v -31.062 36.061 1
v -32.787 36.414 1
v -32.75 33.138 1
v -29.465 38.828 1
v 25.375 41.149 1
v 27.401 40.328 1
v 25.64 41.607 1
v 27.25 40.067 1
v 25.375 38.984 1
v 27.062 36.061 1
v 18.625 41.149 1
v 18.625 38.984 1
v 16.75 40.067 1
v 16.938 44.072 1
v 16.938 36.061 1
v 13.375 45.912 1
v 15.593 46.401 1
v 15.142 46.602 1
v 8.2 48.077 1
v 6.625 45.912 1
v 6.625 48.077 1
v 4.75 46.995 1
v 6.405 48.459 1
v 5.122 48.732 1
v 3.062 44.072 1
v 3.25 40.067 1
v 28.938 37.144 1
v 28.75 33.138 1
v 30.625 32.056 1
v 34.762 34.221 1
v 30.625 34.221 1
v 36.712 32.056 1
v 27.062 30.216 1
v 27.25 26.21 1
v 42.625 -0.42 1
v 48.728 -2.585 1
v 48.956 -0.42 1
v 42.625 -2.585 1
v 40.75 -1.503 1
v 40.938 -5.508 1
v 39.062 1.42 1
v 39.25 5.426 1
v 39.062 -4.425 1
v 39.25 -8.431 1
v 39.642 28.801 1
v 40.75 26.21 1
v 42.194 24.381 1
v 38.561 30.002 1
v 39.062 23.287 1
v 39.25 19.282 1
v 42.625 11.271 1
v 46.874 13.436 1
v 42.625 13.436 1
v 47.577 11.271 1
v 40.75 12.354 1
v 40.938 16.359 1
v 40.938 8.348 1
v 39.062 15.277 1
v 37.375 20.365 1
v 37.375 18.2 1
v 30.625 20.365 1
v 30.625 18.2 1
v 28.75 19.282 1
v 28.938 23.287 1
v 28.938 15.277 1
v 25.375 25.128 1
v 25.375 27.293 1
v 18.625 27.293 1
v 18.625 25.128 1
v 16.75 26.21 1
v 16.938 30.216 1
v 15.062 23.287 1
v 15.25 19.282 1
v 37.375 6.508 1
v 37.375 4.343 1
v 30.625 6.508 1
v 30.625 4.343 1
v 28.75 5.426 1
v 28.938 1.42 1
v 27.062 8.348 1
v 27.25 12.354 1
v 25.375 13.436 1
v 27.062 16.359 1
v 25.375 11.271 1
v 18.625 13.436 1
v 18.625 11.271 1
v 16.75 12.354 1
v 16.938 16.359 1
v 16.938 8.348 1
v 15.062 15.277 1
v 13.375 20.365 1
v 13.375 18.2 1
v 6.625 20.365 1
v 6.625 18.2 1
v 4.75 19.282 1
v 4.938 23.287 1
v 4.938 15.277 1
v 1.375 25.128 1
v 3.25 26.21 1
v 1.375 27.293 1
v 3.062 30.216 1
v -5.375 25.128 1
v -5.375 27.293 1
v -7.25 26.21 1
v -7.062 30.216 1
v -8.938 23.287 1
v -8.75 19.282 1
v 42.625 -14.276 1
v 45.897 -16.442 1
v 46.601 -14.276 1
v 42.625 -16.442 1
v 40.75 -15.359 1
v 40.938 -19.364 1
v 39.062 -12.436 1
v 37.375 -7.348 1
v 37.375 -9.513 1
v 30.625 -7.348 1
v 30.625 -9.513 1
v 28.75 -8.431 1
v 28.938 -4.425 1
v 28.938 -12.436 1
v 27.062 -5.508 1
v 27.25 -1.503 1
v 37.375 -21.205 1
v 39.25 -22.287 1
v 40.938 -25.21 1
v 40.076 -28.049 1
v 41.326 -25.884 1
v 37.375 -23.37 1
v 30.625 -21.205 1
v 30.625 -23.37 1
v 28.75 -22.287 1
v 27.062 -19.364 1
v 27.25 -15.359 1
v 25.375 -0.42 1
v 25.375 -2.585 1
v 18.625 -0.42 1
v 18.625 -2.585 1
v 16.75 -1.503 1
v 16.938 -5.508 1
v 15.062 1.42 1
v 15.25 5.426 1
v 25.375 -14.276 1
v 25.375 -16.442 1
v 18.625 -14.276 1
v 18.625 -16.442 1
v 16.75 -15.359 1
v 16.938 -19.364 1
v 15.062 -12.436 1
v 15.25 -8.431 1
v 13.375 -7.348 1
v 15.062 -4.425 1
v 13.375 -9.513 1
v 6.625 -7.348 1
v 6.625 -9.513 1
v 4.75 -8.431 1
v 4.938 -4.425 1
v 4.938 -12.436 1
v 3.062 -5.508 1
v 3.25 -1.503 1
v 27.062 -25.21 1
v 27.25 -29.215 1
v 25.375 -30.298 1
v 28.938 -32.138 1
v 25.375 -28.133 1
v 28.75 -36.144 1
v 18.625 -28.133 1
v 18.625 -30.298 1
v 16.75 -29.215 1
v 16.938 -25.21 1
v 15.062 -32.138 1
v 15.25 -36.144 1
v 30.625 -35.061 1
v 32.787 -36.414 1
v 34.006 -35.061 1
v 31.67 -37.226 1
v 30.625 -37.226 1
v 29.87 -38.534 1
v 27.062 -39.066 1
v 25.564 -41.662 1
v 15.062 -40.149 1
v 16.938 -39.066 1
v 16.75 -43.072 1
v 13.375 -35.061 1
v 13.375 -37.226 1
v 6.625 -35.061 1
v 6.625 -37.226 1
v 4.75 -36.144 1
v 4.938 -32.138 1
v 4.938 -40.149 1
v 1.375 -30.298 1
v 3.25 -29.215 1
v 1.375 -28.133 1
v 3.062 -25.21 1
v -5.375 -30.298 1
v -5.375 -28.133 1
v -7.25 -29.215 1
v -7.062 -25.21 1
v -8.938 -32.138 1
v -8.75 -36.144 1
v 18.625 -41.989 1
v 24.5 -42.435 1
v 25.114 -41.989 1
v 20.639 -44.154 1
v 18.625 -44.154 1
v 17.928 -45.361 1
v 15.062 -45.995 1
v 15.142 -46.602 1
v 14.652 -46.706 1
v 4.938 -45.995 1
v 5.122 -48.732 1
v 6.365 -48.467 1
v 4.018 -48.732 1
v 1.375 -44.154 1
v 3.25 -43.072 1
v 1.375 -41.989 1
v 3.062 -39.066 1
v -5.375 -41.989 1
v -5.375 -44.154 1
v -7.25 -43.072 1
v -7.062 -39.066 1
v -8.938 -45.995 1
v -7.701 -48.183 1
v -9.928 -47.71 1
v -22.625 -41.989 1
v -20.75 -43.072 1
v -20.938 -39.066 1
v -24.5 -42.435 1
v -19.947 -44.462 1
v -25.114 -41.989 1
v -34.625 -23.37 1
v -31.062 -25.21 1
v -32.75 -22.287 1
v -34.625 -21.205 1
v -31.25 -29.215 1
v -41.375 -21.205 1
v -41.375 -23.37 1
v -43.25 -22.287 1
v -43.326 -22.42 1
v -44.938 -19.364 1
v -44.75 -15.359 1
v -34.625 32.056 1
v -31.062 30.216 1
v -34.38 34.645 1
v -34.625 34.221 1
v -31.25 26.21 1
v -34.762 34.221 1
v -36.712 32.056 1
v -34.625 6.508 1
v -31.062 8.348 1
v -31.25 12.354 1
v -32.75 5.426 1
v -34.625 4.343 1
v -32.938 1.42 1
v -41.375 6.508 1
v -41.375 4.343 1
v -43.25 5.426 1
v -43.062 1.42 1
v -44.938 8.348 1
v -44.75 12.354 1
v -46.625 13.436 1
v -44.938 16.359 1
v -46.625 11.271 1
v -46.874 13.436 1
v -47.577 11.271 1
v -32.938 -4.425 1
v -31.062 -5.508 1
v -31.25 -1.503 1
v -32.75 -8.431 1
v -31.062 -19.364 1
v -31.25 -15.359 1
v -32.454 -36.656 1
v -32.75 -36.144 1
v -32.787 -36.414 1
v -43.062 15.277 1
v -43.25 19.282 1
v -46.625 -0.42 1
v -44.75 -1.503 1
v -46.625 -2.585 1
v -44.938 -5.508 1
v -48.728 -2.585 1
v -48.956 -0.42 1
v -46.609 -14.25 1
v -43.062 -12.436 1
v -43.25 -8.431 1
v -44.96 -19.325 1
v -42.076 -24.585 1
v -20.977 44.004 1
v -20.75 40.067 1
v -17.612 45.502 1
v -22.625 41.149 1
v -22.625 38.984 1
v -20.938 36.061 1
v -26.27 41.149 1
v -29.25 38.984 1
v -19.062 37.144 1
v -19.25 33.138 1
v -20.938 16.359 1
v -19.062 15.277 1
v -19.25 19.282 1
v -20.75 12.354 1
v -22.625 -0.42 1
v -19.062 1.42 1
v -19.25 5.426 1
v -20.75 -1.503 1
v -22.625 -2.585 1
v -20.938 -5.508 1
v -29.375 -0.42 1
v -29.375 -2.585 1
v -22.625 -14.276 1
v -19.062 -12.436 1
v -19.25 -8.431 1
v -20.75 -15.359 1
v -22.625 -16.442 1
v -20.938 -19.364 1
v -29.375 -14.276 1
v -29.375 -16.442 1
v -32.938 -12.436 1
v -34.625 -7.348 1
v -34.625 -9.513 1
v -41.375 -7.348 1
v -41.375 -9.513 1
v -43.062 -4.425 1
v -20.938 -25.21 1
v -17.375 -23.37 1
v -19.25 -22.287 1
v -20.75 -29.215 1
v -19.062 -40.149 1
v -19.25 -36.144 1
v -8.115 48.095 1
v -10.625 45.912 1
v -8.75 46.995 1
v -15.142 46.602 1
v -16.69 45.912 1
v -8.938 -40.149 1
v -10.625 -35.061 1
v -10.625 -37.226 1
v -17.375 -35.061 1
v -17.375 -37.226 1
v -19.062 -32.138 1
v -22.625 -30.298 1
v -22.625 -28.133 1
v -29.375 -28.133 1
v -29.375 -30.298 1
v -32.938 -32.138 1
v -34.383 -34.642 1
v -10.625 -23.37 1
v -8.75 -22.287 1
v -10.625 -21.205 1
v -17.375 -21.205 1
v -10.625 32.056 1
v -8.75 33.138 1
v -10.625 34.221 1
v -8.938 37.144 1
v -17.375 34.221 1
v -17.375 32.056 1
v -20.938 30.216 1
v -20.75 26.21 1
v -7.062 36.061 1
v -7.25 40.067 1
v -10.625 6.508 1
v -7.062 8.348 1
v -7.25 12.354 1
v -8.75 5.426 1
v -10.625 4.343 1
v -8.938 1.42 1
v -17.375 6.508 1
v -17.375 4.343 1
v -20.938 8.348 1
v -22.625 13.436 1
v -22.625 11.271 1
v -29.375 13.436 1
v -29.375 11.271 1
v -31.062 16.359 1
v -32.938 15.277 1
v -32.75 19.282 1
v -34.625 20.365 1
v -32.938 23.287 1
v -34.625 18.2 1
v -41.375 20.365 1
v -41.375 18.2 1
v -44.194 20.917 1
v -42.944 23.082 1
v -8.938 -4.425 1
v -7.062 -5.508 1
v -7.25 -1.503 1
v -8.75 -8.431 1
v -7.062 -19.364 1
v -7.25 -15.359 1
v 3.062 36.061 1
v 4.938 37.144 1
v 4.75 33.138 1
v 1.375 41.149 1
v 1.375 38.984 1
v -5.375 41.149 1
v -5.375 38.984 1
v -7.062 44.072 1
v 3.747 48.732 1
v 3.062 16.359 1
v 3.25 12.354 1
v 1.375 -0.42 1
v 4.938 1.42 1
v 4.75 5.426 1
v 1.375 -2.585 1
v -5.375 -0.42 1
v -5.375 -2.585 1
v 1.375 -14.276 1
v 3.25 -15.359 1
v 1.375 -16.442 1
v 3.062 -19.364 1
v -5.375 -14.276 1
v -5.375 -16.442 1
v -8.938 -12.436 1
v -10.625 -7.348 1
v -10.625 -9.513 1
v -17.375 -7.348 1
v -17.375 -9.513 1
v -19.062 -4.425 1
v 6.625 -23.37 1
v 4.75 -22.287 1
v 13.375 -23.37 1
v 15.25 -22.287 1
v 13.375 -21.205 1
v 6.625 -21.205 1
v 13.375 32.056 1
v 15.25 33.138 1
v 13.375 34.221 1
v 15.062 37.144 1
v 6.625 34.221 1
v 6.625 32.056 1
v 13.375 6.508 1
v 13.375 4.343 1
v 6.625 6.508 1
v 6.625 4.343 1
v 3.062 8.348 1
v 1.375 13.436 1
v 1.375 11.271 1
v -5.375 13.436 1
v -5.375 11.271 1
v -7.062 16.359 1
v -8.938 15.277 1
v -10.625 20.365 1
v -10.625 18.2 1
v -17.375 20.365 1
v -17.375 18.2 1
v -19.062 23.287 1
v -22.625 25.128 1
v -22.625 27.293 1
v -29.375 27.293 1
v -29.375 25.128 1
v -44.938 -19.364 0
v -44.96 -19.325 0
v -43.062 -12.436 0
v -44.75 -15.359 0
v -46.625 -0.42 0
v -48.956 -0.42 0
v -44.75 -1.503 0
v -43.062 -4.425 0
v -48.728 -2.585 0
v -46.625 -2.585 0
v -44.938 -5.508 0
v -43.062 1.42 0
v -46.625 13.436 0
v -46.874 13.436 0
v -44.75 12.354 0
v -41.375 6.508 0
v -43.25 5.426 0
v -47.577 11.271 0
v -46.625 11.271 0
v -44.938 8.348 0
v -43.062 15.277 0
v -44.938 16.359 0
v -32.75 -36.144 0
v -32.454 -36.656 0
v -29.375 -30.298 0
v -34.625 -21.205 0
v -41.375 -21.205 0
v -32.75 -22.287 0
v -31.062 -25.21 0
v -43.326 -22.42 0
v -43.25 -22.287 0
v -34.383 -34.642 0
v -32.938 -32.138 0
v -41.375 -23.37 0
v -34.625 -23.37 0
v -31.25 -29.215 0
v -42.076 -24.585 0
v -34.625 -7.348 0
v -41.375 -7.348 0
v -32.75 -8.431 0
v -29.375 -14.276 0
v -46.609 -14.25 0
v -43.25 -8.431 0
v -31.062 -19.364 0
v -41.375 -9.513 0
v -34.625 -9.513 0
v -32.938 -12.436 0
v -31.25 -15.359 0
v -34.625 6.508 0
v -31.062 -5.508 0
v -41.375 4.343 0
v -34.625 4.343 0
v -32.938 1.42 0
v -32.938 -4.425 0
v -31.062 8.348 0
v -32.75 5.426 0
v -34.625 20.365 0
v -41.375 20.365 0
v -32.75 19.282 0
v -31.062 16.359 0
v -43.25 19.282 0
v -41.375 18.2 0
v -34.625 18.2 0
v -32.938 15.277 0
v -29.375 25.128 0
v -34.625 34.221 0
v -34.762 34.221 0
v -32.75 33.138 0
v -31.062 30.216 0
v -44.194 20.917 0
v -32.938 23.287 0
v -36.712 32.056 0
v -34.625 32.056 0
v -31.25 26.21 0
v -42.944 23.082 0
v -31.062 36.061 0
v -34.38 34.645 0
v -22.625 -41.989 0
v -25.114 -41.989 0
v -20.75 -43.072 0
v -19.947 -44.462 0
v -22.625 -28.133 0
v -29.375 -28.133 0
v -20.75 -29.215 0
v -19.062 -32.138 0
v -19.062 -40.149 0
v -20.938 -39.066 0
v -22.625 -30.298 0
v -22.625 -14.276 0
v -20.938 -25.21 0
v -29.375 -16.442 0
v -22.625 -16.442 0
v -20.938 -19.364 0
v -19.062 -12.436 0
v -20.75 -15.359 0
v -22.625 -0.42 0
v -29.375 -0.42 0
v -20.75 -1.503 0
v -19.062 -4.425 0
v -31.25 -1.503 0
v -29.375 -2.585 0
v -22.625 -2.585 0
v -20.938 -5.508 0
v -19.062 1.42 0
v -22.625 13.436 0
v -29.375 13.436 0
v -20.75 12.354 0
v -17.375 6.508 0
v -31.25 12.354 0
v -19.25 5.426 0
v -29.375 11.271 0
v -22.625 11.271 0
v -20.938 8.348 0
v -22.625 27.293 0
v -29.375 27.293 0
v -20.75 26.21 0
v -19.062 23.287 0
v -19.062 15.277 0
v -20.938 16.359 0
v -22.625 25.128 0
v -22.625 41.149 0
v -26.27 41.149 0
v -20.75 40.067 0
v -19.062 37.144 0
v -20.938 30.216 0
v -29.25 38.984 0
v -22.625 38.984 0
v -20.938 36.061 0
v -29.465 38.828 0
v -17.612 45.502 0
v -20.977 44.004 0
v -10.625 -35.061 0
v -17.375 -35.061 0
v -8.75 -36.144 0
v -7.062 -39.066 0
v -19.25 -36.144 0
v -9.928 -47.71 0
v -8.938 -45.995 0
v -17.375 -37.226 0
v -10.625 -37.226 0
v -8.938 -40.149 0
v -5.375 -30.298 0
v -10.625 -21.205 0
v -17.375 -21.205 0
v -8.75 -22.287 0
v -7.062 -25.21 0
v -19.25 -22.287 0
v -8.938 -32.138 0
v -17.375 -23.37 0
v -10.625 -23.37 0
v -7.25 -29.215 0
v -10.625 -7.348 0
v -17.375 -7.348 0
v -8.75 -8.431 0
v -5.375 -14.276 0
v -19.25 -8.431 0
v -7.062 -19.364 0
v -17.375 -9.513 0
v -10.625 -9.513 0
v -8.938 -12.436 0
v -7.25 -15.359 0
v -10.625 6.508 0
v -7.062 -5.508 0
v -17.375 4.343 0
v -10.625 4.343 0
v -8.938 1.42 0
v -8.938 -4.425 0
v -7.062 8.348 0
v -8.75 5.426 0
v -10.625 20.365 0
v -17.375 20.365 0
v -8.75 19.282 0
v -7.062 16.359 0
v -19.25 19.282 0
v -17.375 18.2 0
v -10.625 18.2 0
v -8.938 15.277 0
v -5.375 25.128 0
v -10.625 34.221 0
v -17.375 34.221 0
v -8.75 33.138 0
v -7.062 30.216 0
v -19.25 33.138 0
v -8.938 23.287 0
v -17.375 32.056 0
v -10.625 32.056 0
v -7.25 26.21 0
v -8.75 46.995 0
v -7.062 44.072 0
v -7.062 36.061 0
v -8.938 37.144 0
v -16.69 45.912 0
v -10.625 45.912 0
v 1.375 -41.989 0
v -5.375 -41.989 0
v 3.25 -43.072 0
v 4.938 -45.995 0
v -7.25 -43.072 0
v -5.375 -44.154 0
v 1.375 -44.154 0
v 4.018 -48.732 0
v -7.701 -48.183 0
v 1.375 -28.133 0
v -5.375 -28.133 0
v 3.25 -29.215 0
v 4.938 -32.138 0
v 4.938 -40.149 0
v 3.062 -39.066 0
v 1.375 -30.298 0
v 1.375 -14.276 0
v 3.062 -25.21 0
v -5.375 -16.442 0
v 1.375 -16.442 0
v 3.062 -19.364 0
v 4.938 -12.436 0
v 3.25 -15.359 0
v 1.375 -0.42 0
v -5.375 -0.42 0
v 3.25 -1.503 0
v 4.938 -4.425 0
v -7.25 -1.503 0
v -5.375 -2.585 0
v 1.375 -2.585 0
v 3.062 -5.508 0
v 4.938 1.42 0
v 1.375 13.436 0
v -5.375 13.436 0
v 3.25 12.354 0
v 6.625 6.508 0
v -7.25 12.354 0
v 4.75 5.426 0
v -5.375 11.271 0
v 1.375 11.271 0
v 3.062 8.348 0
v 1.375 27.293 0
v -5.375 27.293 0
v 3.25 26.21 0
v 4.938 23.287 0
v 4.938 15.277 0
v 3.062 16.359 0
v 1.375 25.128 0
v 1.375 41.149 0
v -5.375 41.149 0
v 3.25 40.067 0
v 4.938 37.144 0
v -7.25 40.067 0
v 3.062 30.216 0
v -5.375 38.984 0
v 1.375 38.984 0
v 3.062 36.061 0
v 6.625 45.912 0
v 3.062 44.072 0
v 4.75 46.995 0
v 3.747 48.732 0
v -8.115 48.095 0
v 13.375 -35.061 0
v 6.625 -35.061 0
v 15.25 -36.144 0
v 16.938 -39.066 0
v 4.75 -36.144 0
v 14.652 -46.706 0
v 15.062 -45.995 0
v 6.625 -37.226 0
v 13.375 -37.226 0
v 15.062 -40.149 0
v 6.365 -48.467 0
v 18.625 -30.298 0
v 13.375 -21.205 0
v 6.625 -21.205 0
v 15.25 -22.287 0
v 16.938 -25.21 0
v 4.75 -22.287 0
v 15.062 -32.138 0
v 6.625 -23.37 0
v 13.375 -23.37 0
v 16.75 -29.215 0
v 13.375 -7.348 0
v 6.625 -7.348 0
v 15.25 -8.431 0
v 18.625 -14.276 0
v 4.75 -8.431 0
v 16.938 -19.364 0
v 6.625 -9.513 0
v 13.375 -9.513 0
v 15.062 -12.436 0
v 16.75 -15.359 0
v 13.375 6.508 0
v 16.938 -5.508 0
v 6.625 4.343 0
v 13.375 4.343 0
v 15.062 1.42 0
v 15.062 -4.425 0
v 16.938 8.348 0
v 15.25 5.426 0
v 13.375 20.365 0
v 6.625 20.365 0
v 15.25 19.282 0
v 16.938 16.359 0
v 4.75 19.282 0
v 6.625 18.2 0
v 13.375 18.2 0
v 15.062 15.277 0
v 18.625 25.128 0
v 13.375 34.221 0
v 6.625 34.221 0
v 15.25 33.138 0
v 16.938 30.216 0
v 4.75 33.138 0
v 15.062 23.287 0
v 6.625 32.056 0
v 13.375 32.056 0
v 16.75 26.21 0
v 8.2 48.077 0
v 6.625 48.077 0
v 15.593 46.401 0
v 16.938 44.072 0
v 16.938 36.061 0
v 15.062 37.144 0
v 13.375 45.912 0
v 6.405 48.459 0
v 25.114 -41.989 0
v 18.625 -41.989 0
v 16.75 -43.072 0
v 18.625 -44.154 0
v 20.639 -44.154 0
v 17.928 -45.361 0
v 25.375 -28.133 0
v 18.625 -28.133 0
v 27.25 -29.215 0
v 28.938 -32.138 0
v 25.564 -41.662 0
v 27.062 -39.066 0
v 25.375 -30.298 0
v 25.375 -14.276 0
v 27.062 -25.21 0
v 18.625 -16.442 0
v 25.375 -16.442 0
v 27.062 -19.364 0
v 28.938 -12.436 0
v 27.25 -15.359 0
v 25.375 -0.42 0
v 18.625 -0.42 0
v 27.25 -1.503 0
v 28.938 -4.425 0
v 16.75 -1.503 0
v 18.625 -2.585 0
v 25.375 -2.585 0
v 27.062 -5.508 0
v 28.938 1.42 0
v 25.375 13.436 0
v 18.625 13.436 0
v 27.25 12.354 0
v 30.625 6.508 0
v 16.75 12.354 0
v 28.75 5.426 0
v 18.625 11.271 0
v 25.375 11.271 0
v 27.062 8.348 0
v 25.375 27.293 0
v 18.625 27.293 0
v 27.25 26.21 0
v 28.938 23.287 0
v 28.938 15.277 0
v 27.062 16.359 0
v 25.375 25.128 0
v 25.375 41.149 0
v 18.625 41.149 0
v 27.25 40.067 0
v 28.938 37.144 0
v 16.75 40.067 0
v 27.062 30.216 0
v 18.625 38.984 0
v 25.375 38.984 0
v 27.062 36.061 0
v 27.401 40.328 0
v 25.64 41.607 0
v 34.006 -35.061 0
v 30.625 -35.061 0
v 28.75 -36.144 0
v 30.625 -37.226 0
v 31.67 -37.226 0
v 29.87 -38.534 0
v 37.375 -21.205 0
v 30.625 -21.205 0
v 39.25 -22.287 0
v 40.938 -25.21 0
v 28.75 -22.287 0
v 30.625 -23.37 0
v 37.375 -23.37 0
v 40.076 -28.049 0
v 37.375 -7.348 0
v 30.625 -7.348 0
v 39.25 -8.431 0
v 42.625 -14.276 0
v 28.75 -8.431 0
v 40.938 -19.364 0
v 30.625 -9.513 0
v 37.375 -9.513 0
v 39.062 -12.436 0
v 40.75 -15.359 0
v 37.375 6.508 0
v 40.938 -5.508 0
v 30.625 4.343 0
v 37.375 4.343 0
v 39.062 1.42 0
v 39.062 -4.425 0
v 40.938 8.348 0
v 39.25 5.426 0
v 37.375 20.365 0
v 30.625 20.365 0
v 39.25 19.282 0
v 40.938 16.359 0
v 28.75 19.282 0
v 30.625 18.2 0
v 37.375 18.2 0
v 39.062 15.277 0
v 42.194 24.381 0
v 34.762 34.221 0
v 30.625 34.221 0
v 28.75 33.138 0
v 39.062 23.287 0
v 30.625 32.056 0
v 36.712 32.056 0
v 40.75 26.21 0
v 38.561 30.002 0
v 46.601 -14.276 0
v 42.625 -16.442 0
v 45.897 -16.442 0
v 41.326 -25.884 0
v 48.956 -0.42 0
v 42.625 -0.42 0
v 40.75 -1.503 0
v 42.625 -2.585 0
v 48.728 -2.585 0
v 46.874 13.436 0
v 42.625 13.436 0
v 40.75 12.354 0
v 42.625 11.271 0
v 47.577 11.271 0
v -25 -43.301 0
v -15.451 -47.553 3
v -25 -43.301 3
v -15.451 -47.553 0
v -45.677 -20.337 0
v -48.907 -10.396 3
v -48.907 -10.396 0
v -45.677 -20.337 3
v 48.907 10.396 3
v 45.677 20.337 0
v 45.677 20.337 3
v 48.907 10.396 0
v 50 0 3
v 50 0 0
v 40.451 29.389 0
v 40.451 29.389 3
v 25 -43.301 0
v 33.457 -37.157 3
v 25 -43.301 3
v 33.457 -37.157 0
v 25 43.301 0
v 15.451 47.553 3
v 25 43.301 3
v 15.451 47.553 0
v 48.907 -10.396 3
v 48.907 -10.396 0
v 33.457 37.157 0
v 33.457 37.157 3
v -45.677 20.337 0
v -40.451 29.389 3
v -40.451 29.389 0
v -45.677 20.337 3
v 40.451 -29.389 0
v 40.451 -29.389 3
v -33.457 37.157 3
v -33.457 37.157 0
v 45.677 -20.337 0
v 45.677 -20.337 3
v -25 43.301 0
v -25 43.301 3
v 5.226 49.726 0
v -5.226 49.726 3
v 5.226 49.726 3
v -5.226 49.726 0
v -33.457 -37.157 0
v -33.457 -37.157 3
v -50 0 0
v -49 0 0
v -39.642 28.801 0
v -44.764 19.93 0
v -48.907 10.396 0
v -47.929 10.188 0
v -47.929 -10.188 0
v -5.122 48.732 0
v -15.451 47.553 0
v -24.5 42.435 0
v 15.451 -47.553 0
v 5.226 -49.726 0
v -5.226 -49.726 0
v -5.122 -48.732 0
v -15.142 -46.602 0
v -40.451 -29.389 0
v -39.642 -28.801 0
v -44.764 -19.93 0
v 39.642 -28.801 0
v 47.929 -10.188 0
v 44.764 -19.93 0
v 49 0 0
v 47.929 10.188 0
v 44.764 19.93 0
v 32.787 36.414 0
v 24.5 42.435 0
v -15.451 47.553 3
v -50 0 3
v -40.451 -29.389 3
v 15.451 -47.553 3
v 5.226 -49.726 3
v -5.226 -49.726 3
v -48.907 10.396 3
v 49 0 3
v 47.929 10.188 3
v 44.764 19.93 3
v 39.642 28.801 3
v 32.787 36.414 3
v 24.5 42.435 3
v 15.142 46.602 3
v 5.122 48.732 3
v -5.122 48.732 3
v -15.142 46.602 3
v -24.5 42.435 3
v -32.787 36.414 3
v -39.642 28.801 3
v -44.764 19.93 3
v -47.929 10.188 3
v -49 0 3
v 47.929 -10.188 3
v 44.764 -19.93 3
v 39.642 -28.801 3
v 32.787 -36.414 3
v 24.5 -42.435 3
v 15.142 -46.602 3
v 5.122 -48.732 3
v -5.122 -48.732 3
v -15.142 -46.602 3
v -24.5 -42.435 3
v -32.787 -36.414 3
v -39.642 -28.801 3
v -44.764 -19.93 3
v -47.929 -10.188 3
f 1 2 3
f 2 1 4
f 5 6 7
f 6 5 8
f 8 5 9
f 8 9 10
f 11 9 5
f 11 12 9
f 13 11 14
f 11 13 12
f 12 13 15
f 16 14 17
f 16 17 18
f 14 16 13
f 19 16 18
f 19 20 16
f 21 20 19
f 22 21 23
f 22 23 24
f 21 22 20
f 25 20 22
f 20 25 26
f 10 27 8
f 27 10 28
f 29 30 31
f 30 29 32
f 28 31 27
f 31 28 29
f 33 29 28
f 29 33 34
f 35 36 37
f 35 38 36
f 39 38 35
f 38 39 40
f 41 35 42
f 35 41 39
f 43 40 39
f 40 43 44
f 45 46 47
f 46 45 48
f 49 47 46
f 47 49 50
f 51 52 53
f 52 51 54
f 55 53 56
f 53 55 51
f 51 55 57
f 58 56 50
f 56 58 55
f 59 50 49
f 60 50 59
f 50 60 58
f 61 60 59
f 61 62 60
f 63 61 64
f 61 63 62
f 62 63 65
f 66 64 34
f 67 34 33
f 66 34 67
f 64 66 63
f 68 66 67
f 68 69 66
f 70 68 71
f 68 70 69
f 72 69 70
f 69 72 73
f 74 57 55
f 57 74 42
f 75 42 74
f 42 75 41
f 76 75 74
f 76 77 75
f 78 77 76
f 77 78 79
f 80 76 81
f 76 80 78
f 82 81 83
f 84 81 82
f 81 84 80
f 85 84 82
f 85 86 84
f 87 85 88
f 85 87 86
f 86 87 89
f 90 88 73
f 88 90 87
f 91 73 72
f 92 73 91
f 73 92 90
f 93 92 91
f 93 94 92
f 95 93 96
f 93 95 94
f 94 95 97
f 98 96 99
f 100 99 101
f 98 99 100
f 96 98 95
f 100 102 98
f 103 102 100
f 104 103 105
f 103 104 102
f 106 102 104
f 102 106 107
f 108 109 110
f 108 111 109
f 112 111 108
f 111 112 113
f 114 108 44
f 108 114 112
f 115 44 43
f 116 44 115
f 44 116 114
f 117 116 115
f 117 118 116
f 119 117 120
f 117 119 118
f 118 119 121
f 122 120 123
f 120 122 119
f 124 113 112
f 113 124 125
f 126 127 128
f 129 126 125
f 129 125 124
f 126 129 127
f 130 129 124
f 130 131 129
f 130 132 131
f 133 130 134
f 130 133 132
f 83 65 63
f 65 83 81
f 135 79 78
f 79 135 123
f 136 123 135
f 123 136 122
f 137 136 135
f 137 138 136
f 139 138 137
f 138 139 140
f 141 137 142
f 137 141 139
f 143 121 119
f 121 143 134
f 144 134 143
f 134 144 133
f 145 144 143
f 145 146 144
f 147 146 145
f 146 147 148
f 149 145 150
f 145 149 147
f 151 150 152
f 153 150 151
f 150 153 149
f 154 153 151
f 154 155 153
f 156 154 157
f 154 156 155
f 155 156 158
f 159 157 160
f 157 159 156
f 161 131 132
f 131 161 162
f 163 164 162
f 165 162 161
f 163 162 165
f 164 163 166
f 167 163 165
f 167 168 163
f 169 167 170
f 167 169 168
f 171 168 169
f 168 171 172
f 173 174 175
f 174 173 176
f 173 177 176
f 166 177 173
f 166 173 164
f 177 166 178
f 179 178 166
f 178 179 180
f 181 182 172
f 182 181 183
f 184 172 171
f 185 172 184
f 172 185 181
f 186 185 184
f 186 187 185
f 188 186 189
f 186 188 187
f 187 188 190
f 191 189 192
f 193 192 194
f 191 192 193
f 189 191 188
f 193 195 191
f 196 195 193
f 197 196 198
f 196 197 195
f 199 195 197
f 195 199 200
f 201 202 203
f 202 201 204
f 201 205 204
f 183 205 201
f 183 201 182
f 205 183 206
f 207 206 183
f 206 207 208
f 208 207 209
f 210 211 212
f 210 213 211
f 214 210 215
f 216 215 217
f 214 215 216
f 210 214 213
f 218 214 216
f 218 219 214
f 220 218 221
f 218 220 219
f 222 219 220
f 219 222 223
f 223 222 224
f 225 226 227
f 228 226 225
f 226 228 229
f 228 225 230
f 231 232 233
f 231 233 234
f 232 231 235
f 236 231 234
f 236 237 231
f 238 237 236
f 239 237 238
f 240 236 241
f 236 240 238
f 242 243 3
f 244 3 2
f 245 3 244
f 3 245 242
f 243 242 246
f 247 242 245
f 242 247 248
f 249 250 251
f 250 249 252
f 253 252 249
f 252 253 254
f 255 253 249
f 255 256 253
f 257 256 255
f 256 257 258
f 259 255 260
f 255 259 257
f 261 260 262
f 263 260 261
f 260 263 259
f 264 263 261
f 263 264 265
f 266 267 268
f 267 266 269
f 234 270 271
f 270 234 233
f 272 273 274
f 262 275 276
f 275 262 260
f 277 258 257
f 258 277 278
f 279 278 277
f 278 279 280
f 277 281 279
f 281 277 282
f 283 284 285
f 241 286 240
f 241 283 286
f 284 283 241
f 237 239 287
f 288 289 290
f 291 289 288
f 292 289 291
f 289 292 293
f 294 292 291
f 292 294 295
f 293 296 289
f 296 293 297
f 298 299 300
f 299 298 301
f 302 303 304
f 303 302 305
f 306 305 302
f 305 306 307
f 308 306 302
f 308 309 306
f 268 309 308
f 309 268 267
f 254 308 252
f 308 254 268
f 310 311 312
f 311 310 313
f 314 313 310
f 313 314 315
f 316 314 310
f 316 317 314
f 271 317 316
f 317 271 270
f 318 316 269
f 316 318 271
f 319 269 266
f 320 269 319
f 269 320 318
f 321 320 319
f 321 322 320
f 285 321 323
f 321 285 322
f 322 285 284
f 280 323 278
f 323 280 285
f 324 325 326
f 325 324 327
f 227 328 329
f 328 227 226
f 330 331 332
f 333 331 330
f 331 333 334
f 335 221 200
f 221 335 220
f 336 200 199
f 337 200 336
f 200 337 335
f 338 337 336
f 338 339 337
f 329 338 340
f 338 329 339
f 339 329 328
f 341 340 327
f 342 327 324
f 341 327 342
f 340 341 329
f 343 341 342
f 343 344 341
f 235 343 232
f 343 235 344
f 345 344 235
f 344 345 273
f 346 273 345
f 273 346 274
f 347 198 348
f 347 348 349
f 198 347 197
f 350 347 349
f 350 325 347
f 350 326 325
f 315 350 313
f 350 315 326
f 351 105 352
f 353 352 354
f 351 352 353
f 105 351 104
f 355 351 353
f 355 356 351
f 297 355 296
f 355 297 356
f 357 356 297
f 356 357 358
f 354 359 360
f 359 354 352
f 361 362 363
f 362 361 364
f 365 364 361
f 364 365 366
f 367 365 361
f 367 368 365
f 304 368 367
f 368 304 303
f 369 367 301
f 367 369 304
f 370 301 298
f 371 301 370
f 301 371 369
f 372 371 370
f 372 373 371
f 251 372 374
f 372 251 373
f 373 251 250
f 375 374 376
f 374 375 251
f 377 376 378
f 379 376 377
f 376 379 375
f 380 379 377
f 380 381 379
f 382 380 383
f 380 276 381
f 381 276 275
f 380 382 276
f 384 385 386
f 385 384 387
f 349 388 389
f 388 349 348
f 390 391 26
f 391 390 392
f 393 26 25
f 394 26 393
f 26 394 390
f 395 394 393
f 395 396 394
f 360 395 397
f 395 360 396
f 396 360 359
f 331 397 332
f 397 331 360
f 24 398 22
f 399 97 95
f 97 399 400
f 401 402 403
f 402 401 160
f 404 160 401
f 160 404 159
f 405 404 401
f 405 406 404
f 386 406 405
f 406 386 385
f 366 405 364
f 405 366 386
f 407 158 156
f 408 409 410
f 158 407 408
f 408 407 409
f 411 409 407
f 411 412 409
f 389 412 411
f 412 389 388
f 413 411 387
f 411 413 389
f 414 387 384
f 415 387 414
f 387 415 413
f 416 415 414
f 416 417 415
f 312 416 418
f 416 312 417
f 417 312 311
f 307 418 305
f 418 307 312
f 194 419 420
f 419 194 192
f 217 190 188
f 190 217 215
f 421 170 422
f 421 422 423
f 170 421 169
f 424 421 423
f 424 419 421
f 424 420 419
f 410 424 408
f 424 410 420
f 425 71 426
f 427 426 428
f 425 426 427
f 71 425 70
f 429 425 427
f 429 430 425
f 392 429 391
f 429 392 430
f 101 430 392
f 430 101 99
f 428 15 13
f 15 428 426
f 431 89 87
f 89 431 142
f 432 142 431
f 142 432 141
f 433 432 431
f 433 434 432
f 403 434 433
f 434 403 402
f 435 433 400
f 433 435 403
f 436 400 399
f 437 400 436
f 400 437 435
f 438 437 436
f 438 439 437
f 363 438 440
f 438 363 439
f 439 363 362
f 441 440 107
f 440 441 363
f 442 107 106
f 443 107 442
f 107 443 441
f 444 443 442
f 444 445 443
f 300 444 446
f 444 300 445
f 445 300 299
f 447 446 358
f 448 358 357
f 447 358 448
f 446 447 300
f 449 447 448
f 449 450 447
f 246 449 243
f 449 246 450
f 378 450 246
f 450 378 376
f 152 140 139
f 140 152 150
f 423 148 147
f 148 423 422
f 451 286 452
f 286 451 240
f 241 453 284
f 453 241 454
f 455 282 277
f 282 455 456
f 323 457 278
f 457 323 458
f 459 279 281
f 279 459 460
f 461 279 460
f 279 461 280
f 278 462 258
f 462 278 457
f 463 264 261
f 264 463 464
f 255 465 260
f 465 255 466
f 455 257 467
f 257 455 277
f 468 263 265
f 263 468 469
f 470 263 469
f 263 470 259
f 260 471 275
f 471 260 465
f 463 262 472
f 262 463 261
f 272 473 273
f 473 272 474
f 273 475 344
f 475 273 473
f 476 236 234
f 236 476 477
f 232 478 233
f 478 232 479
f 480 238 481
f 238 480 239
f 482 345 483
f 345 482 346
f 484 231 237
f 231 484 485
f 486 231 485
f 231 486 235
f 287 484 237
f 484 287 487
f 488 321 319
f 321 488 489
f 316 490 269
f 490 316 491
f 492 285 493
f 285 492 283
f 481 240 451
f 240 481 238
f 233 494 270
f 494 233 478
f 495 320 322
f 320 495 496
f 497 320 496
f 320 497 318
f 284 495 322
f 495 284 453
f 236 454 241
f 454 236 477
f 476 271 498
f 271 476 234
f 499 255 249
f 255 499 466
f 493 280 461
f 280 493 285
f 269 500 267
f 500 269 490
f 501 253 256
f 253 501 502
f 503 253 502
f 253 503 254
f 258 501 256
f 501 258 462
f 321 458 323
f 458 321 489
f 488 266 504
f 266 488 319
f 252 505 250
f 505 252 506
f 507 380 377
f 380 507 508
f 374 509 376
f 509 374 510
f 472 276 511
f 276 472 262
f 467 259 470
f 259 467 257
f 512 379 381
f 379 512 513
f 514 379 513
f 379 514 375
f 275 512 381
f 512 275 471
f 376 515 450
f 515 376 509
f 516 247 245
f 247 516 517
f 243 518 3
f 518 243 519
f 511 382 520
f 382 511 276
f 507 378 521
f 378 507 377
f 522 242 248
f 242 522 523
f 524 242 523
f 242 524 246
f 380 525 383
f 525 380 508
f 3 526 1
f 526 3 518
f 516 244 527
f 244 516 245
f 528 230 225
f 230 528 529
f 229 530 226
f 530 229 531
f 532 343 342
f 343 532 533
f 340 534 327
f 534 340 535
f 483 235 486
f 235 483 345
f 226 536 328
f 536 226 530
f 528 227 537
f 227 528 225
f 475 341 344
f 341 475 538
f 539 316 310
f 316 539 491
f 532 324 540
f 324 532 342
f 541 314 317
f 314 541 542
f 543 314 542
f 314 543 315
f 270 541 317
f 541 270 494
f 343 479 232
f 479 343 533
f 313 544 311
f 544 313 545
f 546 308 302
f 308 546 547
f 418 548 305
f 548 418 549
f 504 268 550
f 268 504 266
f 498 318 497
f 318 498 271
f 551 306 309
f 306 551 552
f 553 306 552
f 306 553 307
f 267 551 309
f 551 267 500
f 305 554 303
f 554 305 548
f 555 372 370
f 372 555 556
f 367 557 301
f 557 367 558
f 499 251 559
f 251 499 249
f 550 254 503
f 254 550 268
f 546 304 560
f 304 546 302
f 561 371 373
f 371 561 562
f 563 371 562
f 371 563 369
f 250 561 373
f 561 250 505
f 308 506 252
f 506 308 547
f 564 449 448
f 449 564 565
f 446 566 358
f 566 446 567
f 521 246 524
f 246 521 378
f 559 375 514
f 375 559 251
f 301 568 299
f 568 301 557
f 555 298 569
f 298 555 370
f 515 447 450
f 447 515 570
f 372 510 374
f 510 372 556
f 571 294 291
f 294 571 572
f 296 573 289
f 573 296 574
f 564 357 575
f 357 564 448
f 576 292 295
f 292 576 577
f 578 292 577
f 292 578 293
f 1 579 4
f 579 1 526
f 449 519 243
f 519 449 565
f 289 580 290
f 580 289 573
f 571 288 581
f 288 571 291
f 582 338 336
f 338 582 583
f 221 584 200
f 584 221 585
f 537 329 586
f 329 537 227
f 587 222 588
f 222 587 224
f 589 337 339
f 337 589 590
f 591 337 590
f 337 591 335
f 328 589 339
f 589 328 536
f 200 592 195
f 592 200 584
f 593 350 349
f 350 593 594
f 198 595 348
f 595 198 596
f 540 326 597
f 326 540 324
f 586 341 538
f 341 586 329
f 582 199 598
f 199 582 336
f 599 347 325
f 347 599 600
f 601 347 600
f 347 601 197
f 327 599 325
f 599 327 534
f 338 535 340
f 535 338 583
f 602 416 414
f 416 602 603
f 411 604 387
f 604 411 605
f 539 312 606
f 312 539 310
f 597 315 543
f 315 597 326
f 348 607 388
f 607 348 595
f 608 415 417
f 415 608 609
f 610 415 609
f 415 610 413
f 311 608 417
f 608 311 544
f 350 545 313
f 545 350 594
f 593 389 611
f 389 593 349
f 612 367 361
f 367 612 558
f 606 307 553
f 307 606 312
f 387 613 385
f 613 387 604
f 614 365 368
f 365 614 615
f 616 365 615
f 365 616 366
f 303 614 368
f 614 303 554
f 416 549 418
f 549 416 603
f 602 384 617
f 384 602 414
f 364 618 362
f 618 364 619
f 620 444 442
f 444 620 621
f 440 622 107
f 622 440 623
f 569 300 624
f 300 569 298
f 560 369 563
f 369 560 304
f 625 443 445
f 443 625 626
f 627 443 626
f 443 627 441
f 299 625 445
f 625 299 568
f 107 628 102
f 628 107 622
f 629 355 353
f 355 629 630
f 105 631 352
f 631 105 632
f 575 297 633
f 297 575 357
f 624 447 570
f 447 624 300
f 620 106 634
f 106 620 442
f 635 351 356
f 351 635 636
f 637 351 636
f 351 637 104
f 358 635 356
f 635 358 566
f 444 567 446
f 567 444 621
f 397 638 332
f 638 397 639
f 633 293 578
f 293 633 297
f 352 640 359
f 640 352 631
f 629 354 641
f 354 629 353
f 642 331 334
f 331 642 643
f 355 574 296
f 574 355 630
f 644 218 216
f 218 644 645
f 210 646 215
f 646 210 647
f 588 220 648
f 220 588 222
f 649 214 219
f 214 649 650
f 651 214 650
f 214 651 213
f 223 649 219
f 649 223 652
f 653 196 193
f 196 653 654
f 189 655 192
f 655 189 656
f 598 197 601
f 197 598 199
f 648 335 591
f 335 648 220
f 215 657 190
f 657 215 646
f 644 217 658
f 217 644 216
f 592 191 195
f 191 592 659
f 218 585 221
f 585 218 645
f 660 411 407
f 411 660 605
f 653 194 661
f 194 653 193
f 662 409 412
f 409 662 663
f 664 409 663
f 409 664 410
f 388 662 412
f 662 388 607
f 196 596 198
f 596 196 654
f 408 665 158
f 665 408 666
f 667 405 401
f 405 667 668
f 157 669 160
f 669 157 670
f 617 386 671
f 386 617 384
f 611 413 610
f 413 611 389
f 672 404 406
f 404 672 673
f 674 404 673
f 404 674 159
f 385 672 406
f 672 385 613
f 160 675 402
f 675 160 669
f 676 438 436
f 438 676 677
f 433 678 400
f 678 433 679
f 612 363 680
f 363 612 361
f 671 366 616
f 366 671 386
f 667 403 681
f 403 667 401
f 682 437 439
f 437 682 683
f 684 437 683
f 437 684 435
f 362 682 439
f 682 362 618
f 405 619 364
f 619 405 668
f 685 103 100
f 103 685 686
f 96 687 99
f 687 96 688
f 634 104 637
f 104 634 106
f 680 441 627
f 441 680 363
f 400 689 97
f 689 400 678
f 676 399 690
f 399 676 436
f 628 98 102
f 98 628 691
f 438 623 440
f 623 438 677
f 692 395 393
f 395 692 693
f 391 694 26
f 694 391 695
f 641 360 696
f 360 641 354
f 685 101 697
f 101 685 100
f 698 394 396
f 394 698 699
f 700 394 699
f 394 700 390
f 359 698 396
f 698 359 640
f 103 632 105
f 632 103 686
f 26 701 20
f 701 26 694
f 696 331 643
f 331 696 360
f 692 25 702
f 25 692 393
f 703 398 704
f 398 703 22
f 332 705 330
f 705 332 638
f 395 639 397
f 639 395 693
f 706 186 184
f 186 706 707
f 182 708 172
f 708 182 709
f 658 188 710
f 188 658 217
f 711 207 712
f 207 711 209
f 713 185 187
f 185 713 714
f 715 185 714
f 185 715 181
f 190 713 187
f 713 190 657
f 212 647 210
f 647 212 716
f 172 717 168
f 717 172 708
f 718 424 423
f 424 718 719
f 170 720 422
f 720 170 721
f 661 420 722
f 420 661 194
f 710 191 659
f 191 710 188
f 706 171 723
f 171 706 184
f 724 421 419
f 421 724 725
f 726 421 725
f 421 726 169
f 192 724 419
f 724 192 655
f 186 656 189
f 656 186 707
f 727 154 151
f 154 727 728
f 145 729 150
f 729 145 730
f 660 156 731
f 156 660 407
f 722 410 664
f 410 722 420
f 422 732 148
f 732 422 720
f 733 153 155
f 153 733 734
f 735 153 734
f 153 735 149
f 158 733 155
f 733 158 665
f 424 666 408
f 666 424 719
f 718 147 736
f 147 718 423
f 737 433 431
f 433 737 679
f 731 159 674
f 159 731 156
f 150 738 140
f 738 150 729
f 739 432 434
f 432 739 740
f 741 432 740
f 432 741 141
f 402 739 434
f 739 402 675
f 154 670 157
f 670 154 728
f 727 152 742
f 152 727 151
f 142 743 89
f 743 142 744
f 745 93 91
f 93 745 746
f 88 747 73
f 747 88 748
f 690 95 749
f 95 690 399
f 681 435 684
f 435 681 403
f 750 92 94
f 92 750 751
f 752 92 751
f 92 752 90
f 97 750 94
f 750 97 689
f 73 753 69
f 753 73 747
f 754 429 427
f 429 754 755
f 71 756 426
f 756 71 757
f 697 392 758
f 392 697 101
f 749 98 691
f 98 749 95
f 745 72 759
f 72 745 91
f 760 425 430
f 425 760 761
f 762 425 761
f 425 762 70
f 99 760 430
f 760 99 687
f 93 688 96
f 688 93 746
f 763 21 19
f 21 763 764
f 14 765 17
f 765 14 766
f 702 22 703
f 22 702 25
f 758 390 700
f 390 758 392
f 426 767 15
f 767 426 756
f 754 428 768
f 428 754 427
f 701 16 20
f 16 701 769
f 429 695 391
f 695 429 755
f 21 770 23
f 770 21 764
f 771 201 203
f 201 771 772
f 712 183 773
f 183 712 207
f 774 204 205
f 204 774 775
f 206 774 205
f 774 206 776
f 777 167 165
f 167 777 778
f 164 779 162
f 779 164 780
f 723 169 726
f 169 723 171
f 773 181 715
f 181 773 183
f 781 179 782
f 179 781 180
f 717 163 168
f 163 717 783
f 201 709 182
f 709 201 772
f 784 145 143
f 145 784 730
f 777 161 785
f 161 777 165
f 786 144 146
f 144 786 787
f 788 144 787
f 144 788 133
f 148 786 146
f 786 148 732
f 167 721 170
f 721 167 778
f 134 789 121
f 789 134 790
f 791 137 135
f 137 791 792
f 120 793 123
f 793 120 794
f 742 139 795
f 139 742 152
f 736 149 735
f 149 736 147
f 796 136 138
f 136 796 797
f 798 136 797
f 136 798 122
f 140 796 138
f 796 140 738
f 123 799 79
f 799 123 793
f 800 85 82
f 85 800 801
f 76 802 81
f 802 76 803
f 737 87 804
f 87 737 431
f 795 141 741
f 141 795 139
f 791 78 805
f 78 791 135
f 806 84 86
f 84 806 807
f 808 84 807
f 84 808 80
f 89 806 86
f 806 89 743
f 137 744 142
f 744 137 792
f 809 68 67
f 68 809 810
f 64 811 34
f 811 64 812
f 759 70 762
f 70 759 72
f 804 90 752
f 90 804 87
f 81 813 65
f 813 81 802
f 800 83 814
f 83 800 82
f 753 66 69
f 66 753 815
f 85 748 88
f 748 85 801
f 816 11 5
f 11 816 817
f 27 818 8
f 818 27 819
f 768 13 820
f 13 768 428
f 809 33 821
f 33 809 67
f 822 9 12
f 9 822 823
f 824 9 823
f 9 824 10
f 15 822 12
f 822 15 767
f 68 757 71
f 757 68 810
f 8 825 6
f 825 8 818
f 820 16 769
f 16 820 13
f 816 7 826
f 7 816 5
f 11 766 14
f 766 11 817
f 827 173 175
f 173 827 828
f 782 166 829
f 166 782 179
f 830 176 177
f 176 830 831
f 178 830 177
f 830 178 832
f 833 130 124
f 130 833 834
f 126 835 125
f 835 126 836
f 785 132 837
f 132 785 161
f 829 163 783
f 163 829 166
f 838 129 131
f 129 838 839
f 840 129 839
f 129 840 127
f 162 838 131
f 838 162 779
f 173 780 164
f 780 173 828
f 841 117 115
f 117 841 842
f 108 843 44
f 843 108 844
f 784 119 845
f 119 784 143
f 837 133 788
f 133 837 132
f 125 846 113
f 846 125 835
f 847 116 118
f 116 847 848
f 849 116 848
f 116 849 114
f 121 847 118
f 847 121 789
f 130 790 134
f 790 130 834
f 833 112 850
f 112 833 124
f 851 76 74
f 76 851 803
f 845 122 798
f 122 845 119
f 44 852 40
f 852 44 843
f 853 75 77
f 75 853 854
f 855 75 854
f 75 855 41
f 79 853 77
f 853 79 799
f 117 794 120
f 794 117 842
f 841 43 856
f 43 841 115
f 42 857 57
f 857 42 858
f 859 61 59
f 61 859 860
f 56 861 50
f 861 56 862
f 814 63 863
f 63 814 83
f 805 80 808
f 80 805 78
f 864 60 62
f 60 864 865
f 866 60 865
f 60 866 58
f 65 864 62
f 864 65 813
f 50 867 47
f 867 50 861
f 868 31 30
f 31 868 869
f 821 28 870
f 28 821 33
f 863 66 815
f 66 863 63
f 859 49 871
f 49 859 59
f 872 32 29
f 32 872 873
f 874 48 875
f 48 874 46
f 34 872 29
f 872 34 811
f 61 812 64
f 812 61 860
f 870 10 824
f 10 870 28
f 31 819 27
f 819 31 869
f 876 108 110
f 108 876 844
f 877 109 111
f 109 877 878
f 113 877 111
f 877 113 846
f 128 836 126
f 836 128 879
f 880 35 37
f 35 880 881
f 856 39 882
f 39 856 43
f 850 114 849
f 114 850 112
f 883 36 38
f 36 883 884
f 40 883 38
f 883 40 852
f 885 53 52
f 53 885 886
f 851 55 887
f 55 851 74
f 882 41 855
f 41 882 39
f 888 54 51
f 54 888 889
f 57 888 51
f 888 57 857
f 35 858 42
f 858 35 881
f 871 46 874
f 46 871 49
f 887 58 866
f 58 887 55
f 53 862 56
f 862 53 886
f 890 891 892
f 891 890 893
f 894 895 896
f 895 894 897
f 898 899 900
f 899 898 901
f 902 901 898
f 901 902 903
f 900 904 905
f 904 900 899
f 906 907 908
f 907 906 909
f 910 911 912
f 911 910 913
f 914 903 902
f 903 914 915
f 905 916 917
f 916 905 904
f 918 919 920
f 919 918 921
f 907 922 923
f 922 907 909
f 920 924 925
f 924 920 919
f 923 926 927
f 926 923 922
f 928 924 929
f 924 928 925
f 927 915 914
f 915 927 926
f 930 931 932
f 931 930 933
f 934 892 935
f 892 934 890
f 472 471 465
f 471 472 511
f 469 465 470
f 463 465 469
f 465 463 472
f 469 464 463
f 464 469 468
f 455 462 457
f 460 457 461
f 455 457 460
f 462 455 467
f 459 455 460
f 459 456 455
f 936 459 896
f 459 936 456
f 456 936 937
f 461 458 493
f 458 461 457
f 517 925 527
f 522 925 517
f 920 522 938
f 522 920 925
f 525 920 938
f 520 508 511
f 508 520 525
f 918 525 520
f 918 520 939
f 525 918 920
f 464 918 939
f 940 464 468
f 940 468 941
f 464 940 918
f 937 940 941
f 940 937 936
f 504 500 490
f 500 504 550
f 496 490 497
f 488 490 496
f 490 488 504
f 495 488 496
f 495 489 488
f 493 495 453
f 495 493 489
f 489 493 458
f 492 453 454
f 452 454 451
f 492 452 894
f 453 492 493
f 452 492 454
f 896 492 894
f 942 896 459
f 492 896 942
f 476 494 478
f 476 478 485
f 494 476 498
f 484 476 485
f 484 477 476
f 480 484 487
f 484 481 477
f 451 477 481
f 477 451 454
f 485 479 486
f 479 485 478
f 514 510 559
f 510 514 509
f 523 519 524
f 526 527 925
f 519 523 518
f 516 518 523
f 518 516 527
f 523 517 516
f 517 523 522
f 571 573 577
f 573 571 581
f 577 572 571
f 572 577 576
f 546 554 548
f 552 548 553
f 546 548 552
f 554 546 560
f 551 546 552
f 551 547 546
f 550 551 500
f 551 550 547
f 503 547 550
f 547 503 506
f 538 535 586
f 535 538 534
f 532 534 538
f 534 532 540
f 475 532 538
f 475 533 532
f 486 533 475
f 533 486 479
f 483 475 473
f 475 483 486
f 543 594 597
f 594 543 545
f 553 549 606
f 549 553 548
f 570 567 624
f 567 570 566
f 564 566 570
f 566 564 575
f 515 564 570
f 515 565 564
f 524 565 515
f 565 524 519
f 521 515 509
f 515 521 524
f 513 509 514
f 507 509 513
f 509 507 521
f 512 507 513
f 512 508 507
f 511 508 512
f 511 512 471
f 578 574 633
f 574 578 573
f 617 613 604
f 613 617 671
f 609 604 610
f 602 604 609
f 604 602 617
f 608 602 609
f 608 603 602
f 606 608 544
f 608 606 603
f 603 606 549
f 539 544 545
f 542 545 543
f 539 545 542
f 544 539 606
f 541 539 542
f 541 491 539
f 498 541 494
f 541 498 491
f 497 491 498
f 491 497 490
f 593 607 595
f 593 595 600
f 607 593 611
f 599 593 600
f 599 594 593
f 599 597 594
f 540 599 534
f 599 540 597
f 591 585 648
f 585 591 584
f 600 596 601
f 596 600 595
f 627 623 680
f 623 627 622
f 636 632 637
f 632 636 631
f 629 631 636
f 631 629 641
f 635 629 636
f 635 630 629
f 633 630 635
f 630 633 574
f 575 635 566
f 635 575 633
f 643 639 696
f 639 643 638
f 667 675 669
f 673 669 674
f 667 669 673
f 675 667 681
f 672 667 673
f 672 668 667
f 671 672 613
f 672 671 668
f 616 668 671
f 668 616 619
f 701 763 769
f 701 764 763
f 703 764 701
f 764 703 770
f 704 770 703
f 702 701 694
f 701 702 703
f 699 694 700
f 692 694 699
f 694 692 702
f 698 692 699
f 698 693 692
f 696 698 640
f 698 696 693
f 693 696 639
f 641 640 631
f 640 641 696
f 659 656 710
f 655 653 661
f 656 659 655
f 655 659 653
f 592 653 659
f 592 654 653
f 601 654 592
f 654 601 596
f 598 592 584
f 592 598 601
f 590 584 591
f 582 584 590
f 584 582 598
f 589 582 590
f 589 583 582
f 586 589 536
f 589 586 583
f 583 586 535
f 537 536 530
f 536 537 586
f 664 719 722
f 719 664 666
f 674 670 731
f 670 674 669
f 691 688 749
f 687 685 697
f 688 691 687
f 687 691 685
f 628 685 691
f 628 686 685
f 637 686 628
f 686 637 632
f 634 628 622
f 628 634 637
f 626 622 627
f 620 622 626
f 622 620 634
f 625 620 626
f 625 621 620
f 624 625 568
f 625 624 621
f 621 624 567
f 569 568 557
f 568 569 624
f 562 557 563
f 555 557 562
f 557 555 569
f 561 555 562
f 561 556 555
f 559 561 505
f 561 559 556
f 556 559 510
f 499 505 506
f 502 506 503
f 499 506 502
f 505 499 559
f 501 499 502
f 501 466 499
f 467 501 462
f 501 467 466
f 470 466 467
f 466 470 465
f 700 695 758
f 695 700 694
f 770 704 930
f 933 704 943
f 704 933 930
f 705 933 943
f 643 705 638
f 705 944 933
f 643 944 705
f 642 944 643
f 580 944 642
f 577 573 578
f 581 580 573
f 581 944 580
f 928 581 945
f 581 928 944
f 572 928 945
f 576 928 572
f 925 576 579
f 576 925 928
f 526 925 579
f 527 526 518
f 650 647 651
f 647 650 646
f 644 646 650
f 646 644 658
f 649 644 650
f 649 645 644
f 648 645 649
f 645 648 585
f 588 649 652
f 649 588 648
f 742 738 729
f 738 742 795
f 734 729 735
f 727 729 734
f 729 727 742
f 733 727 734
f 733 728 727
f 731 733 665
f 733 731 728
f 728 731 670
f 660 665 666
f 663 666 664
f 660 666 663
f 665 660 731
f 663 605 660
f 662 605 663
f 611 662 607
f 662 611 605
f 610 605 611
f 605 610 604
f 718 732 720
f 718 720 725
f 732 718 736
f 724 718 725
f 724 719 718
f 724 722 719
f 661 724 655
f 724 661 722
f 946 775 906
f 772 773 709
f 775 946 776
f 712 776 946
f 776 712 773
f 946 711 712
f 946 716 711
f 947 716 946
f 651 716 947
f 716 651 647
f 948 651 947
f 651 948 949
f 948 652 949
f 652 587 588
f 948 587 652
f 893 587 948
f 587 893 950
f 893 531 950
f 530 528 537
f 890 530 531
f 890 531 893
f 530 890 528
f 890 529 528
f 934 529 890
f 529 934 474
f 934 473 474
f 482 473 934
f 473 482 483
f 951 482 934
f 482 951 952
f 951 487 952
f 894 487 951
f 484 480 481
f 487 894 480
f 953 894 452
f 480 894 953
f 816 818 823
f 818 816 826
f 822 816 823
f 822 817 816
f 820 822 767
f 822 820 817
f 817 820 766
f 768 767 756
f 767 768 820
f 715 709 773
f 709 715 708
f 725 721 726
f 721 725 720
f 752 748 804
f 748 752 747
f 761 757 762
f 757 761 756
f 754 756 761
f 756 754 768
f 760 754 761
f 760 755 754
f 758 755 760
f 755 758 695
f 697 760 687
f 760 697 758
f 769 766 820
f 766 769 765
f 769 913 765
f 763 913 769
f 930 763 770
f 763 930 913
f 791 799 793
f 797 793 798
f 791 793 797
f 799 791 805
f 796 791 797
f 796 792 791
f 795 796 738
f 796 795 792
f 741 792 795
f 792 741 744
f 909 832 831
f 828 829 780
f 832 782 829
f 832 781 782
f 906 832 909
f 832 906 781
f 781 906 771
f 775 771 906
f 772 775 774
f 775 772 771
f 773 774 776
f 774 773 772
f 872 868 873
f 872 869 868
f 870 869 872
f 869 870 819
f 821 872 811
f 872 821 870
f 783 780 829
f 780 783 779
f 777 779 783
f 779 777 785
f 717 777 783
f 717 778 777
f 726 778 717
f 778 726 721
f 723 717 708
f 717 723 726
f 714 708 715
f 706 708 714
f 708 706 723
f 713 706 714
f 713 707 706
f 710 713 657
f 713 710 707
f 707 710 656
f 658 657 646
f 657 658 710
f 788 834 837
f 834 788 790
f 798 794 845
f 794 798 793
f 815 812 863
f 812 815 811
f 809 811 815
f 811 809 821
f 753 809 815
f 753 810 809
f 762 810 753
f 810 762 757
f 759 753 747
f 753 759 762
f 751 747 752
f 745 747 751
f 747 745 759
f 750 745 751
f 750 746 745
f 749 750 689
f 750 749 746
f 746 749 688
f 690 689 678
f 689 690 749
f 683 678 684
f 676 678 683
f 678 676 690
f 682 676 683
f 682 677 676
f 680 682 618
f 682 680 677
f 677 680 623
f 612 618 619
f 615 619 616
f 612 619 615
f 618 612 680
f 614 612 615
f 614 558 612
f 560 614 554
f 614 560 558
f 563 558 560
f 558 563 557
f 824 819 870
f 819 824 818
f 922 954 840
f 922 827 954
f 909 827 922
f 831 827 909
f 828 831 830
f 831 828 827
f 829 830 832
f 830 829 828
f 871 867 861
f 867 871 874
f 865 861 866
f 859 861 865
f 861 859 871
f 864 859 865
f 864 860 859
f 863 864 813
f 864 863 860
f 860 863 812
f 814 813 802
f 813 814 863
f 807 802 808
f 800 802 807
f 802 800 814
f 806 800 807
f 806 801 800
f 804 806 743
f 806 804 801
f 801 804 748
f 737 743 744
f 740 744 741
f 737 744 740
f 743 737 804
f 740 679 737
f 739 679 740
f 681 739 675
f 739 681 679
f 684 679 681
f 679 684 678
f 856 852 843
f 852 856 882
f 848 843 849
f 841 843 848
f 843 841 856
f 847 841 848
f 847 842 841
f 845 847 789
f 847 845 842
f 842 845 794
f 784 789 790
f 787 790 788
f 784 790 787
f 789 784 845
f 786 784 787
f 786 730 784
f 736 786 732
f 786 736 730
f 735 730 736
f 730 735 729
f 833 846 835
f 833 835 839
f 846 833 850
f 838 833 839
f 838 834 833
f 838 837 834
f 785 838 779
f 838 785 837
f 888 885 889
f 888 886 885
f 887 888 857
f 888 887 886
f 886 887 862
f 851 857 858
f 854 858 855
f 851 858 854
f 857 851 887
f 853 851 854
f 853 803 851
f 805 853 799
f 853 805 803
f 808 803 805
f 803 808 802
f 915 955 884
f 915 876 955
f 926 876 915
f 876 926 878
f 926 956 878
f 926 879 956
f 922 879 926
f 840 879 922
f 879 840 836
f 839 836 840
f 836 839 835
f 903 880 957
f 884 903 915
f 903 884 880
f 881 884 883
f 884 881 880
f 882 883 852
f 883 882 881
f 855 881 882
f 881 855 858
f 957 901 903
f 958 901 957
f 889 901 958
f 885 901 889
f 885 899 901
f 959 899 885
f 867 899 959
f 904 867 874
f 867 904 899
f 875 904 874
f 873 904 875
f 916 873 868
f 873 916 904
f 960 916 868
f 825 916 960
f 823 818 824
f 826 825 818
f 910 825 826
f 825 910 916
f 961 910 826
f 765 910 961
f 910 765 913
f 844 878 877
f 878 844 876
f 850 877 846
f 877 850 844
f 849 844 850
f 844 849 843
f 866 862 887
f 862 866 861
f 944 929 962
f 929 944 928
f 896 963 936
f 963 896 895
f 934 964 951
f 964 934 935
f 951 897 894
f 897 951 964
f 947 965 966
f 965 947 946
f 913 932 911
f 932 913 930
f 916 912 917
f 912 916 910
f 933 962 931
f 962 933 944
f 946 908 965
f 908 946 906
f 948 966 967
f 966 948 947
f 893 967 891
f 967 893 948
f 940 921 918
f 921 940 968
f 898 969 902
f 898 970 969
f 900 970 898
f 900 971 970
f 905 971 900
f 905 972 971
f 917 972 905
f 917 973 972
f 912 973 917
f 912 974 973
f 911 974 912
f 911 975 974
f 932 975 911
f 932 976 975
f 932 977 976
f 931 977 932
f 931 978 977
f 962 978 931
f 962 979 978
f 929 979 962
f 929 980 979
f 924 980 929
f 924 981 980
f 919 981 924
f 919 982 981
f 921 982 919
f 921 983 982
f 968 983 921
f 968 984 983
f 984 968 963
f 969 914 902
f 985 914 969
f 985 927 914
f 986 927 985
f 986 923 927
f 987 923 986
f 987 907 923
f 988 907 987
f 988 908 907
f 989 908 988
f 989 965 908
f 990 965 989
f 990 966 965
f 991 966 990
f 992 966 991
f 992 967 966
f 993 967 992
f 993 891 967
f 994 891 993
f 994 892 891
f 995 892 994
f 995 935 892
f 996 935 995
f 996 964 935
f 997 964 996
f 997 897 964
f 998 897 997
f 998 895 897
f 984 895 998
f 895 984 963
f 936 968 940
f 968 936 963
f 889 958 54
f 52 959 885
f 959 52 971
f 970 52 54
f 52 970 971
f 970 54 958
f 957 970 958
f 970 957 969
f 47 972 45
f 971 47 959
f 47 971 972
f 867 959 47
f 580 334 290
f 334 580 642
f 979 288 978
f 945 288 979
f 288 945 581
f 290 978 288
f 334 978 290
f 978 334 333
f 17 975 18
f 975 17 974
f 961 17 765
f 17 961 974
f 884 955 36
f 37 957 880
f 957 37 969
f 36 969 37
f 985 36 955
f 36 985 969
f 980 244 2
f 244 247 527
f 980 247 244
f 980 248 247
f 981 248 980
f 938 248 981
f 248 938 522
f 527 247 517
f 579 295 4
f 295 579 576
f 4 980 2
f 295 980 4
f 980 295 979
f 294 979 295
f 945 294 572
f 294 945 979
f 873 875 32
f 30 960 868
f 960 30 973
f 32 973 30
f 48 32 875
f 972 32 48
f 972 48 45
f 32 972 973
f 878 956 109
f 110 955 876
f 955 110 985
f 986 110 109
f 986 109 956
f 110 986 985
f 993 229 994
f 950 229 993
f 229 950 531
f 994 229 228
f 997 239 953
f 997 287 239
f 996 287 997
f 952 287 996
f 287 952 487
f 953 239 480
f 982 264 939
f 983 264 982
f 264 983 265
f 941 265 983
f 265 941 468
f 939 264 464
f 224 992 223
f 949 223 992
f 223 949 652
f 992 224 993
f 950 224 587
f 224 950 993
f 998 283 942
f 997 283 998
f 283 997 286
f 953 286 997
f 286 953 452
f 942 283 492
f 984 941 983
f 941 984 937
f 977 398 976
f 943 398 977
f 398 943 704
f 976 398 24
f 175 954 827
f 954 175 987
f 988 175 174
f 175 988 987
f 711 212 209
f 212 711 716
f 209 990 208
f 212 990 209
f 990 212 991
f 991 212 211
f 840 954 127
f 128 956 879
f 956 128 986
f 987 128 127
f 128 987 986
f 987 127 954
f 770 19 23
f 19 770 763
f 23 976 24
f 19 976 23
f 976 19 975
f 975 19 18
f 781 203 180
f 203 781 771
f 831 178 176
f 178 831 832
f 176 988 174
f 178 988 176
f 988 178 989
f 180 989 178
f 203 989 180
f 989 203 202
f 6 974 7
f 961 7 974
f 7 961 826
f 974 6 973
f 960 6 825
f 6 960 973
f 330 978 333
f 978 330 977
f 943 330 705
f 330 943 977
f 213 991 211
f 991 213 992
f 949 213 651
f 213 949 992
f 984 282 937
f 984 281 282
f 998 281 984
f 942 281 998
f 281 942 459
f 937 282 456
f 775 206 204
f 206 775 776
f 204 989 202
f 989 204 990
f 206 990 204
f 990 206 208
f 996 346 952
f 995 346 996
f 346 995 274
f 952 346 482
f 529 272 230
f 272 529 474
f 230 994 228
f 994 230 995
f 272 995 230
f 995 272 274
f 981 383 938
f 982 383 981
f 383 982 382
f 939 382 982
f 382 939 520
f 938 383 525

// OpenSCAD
// Customizable hex pattern
// Created by Kjell Kernen
// Date 11.10.2015

/*[Pattern Parameters]*/
// of the pattern in mm:
diameter=100;           // [10:150]

// of the pattern in tens of mm:
height=20;              // [2:200]

// in tens of mm:
border_width=20;        // [2:100]

// in tens of mm:
border_height=30;       // [2:100]

// in mm:
hex_radius=8;           // [1:20]

// in tens of mm: 
hex_border_width=25;    // [2:50]

/*[Hidden]*/
x=sqrt(3/4*hex_radius*hex_radius);
ystep=2*x;
xstep=3*hex_radius/2;

module hex(x,y)
{
	difference()
	{
		translate([x,y,-height/20]) 
			cylinder(r=(hex_radius+hex_border_width/20), h=height/10, $fn=6);	
		translate([x,y,-(height/20)-1]) 
			cylinder(r=(hex_radius-hex_border_width/20), h=(height/10)+2, $fn=6);
	}
}

//Pattern
intersection()
{
    intersection()
	{
		for (xi=[0:xstep:diameter])
			for(yi=[0:ystep:diameter])
				hex(xi-diameter/2,((((xi/xstep)%2)==0)?0:ystep/2)+yi-diameter/2);
		translate([-diameter/2, -diameter/2, -height/20]) 
			cube([diameter,diameter,height/10]);
	}
	cylinder( d=diameter, h=height );
}

// Frame
difference()
{
	cylinder( d=diameter, h=border_height/10 );
	translate ([0,0,-1])
		cylinder( d=diameter-border_width/10, h=(border_height/10) + 2  );
}
